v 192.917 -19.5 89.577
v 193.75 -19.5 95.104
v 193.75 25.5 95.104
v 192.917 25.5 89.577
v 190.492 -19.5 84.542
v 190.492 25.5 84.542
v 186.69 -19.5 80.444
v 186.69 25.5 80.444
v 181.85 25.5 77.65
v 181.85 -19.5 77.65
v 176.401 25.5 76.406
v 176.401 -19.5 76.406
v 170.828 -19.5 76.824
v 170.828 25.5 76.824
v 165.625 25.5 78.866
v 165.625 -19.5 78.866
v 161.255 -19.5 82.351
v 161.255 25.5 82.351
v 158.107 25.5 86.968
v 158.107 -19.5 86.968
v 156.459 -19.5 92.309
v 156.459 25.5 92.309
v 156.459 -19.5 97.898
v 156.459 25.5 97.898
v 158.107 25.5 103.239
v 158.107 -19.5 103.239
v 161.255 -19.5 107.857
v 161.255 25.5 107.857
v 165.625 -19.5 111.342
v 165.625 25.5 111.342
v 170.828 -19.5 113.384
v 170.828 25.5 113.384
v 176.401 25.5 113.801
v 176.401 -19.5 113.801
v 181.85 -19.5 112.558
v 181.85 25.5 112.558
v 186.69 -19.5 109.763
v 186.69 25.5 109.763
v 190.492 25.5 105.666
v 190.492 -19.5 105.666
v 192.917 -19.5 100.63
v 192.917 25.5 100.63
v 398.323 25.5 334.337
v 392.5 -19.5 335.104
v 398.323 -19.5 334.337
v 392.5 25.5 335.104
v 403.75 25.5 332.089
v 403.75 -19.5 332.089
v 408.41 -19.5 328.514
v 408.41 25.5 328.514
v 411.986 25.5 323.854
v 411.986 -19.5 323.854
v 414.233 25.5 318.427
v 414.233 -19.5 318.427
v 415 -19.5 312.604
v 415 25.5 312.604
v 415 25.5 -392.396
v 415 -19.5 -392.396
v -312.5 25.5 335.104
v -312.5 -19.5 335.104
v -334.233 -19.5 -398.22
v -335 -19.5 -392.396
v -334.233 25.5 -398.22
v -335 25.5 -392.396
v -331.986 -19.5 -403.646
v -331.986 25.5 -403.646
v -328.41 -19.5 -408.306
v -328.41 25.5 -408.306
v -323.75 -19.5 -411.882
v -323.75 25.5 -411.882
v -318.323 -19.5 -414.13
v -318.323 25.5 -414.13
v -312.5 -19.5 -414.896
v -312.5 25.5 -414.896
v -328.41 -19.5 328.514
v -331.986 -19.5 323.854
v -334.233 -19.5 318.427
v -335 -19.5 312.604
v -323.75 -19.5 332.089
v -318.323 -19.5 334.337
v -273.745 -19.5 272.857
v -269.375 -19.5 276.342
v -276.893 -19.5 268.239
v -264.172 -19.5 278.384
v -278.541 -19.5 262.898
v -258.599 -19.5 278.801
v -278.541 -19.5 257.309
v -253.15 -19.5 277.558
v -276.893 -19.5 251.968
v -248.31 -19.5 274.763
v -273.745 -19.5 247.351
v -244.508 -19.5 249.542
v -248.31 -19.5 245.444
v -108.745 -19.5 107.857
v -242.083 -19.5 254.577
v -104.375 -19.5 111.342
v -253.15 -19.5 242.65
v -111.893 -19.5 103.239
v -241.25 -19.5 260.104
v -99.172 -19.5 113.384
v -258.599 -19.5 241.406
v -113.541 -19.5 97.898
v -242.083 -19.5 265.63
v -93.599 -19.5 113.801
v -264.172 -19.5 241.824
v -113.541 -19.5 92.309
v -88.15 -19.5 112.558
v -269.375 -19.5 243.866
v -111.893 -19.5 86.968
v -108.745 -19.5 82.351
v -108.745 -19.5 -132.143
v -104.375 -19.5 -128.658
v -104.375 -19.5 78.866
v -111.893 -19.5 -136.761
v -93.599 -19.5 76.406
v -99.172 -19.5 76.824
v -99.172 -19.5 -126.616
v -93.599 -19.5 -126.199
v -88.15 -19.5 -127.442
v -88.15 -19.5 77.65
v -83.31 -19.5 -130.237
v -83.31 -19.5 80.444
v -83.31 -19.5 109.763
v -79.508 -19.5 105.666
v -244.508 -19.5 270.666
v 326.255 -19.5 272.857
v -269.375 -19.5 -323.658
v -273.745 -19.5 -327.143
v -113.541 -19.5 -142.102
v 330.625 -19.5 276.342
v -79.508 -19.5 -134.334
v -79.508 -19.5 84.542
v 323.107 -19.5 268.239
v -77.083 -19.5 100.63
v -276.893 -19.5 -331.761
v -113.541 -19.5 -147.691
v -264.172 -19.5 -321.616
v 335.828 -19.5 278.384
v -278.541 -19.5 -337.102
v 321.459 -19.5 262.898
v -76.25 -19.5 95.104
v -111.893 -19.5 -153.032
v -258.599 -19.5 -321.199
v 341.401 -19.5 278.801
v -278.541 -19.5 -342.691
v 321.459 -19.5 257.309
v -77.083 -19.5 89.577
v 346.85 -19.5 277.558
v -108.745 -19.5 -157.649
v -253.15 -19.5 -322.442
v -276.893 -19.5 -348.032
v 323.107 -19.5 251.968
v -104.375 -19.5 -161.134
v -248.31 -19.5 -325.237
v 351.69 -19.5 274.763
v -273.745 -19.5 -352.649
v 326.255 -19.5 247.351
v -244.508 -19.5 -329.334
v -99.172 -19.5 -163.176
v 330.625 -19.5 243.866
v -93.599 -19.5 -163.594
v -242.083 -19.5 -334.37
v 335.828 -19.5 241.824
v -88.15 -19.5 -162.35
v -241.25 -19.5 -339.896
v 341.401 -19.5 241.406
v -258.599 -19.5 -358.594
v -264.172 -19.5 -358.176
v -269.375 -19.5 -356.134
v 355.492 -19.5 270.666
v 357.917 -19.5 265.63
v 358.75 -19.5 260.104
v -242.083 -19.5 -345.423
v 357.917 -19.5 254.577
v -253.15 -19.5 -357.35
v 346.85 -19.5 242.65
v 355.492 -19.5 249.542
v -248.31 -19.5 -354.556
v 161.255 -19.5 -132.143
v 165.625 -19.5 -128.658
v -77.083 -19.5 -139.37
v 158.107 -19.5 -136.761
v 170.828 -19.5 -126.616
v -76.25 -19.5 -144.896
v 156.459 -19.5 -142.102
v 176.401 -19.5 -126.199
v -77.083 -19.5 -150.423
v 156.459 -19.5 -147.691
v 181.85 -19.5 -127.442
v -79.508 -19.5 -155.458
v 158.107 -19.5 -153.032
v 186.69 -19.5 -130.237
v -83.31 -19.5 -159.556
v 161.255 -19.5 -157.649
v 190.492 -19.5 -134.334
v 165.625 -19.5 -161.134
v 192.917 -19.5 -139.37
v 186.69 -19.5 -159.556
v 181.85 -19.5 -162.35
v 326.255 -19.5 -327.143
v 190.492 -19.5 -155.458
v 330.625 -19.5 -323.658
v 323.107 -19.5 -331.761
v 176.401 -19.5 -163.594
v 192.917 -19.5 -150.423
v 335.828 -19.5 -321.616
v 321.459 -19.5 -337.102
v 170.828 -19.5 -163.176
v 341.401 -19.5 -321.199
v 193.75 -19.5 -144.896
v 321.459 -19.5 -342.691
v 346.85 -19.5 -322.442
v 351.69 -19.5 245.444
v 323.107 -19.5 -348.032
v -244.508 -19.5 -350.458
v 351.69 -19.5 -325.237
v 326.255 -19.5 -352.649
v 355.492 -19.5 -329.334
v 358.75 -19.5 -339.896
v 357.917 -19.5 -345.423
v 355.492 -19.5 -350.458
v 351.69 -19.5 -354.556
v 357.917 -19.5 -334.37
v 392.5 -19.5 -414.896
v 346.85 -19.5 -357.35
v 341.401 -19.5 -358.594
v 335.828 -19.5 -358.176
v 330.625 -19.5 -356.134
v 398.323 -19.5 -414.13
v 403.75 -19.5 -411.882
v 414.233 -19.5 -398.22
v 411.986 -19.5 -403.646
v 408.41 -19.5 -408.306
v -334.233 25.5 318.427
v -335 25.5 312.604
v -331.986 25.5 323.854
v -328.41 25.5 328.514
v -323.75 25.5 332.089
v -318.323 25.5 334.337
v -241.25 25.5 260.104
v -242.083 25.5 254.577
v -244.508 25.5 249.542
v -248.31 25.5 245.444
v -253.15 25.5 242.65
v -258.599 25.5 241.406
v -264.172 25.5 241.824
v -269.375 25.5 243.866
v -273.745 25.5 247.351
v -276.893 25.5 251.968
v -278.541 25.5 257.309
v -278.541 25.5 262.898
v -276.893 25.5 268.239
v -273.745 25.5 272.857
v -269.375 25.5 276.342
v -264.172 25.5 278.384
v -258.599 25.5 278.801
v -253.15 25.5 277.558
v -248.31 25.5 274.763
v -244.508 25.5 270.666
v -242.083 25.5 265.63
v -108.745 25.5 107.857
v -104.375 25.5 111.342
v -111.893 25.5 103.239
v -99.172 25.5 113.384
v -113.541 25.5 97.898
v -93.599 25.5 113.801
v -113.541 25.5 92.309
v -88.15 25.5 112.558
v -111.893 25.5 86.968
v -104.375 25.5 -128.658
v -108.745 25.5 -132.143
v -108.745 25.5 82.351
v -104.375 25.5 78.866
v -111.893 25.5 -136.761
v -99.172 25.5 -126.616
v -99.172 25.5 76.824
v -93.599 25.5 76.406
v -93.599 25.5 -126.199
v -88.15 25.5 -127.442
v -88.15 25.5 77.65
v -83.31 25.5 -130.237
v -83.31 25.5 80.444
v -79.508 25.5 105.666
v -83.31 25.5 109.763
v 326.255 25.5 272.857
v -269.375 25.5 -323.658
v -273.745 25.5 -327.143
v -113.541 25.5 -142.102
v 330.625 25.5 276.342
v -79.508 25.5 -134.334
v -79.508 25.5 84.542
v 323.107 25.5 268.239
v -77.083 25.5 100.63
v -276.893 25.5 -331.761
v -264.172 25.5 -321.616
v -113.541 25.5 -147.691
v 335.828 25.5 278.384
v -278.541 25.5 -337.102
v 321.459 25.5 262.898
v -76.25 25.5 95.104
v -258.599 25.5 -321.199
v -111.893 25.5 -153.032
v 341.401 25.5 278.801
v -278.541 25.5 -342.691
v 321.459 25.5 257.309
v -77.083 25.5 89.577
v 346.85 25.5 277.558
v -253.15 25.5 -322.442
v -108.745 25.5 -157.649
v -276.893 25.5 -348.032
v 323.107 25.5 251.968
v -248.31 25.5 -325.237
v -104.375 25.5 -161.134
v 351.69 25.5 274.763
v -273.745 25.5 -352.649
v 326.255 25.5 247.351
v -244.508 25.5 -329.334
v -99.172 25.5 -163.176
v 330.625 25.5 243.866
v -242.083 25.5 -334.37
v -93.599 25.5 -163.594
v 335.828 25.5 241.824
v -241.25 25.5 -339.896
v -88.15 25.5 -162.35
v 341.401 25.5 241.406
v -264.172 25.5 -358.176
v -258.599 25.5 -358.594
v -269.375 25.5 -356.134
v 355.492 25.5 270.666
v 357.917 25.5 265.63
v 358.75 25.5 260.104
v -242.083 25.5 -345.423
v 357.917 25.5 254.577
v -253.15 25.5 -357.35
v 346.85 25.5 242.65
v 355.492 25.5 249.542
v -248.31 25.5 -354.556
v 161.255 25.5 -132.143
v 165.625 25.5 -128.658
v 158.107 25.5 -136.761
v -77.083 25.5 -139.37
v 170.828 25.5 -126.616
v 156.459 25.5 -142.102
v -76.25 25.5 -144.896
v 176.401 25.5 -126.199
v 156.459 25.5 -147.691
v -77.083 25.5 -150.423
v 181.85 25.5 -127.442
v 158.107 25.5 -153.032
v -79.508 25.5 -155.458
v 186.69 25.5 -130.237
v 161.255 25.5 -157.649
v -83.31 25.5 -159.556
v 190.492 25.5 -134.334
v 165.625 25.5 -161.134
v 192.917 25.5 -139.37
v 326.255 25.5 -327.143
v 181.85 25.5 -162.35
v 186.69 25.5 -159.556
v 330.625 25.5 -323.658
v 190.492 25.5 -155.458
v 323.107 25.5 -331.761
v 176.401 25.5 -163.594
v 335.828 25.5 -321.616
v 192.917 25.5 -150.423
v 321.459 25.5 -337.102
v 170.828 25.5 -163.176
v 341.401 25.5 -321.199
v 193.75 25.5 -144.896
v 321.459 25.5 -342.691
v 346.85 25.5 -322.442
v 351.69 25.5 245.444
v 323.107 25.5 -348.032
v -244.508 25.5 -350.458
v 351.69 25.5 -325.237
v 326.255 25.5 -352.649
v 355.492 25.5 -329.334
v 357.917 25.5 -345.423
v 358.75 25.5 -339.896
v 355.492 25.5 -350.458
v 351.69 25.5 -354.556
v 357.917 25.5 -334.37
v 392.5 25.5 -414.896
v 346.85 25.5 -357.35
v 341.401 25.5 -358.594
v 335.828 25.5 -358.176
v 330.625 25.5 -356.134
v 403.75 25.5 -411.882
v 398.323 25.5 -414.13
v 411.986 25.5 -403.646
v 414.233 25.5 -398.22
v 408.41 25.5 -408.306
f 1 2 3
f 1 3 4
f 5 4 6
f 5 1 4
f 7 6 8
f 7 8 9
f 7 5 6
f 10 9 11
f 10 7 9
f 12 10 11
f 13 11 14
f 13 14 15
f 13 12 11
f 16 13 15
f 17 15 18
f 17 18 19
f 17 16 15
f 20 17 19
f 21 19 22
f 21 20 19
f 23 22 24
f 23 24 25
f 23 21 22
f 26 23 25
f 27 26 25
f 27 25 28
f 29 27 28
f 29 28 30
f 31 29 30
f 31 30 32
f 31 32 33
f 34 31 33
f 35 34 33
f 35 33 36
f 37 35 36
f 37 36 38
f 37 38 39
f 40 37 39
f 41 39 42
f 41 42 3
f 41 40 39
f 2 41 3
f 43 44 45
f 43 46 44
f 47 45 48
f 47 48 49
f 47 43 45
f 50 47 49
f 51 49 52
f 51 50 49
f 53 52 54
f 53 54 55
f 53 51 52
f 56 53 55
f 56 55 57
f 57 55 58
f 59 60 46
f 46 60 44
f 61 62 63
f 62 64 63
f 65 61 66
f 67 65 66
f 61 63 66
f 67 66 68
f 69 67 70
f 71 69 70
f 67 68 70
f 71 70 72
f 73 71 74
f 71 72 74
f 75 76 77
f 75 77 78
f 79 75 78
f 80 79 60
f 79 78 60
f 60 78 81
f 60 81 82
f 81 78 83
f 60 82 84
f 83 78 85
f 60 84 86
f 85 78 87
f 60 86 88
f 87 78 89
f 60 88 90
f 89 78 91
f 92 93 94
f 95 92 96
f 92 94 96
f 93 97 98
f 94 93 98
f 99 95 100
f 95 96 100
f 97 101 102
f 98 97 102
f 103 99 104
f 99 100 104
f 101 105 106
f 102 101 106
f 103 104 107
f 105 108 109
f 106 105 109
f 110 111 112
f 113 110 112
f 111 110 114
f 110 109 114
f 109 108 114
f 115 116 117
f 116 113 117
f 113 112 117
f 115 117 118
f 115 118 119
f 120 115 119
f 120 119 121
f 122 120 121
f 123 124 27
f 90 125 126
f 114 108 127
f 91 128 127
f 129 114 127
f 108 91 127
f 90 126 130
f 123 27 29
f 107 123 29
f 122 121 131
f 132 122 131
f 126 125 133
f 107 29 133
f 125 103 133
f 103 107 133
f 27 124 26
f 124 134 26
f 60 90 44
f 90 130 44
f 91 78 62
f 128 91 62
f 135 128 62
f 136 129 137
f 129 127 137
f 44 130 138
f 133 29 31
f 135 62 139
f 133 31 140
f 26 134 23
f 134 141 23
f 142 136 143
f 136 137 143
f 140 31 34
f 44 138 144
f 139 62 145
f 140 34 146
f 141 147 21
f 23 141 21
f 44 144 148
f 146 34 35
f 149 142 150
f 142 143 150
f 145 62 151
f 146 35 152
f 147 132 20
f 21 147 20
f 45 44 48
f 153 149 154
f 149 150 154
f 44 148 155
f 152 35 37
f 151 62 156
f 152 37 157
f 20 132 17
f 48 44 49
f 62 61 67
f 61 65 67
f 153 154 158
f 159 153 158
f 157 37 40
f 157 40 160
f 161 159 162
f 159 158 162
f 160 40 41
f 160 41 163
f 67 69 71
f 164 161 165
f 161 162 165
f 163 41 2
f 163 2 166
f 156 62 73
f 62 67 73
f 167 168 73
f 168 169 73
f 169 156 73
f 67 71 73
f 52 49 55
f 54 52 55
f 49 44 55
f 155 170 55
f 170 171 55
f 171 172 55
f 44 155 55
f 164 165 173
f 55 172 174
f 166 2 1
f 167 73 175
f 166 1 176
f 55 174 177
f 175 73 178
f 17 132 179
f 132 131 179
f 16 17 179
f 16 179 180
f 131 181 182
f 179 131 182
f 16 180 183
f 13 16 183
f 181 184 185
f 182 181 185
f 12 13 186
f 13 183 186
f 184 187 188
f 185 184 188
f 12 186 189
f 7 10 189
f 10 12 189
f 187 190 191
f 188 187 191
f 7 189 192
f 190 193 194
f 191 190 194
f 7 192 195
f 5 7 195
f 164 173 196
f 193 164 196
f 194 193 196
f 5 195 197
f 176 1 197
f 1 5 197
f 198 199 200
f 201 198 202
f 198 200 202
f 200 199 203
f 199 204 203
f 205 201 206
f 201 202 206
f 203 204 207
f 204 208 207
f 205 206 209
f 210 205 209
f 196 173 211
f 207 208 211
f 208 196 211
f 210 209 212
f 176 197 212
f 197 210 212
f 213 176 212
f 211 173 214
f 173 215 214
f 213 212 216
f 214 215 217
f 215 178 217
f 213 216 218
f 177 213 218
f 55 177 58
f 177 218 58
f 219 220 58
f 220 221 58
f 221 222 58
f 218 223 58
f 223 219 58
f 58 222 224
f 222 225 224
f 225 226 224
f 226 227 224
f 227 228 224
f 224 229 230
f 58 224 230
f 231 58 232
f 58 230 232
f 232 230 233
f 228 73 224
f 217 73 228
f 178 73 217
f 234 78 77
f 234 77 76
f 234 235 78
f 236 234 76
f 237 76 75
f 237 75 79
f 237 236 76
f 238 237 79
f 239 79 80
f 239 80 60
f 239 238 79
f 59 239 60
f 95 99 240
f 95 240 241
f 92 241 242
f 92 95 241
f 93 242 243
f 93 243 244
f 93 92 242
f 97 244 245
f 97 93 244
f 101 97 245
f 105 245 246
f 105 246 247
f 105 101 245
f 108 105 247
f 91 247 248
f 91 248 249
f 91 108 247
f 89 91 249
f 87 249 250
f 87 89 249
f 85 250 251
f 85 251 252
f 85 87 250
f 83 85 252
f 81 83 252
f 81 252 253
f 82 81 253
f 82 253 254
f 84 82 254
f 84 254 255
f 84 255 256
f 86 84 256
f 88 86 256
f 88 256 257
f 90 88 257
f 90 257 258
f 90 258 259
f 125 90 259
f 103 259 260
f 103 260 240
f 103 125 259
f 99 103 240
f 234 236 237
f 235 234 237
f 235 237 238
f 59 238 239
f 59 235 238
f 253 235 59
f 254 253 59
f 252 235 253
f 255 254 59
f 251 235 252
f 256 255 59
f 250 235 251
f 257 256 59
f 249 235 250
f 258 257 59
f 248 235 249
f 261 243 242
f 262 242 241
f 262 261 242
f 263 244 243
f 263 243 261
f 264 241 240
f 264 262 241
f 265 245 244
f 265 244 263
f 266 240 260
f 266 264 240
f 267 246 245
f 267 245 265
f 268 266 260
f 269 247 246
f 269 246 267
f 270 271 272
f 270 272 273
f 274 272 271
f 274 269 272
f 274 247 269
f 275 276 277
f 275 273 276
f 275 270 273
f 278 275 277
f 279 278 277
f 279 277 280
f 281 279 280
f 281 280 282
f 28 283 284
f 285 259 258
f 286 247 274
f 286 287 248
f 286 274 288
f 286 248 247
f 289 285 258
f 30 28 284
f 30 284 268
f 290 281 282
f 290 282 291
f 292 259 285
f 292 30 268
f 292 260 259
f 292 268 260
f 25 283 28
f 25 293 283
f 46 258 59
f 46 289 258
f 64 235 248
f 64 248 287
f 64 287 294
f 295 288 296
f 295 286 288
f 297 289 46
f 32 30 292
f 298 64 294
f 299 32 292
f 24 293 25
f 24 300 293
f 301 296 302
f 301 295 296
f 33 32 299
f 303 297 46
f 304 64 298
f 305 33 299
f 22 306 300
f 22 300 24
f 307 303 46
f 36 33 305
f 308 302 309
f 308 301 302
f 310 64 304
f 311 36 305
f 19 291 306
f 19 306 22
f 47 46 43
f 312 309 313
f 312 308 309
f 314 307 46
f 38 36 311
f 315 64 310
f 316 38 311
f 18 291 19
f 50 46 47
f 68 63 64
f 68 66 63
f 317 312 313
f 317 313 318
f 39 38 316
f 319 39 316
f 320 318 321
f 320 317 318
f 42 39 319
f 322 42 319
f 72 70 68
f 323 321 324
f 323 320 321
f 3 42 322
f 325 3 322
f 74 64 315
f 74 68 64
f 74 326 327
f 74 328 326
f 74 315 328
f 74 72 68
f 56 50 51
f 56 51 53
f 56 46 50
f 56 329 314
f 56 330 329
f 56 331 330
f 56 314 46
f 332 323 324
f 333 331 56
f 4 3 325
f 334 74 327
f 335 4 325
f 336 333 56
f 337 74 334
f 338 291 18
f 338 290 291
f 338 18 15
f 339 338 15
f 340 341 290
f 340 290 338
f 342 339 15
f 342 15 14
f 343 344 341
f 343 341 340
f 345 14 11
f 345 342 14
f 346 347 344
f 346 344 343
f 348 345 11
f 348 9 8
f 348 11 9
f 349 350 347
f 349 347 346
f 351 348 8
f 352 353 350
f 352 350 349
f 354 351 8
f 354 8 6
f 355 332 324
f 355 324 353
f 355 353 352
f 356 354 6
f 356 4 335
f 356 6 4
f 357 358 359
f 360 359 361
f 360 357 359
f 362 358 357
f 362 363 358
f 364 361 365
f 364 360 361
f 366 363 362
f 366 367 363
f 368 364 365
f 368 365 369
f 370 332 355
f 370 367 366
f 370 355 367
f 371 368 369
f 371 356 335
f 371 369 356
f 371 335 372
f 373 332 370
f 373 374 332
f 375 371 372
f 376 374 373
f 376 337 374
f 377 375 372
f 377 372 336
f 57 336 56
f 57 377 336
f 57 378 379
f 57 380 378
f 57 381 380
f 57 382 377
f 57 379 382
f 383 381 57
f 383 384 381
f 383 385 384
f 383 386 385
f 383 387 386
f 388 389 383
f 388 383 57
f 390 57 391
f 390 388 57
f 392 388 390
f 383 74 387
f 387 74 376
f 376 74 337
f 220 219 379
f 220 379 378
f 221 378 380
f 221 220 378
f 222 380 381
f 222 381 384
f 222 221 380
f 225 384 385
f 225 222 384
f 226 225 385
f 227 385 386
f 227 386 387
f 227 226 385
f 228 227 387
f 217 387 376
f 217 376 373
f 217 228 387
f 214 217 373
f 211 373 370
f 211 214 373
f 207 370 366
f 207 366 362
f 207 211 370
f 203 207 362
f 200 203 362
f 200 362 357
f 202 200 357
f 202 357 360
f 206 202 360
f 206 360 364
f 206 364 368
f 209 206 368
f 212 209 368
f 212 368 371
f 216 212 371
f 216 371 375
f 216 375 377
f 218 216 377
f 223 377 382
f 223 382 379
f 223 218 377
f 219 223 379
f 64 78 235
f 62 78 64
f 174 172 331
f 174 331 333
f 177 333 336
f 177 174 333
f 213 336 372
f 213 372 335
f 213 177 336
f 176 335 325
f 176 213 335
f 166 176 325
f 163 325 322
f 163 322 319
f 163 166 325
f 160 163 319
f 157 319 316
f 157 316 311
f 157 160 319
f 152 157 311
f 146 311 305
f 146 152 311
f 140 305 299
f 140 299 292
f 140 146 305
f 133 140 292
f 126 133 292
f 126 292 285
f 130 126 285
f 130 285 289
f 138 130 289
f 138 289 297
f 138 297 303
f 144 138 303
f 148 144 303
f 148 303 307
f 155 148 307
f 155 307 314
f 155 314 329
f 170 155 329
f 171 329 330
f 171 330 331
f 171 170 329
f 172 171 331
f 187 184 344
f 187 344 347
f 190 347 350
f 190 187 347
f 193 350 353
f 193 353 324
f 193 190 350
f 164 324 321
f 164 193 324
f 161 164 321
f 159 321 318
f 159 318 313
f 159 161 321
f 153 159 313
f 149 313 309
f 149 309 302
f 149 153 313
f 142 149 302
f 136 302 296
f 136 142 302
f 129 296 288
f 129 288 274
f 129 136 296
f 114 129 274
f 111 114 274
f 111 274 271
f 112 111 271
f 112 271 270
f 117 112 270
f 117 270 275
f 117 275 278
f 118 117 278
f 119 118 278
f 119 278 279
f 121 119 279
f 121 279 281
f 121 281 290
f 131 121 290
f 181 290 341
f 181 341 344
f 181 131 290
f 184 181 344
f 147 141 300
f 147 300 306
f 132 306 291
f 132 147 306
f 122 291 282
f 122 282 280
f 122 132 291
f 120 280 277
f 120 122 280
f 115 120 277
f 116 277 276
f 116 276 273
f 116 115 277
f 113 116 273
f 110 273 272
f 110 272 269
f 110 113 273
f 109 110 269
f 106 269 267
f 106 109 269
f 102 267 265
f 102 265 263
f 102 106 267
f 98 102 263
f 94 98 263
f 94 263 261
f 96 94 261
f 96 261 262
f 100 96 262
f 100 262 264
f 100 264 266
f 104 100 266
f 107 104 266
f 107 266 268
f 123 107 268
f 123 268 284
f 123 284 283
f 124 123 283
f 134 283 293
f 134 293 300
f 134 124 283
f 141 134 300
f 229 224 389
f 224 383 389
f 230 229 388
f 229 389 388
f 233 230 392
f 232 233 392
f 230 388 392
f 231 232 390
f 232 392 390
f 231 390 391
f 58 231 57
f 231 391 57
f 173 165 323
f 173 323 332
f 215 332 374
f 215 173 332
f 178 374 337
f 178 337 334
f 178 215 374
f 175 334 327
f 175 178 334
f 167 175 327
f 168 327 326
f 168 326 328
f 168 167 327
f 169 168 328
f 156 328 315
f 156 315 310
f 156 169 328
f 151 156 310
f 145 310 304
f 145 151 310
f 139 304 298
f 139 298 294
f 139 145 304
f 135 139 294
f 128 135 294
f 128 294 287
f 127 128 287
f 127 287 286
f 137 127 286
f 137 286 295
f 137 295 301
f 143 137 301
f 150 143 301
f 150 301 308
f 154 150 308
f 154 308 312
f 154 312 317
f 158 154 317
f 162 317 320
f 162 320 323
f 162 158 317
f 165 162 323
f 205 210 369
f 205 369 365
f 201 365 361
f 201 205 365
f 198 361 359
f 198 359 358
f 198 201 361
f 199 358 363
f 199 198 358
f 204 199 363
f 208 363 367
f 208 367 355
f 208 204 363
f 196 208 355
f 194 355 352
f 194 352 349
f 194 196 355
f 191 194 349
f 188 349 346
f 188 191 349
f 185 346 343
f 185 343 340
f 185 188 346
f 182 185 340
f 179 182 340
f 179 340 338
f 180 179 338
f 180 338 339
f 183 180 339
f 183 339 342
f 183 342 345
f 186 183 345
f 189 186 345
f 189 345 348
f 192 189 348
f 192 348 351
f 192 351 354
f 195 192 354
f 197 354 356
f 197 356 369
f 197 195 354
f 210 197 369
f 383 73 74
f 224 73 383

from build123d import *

# Parameters (mm, degrees)
SKETCH1_W           = 100
SKETCH1_H           = 100
SKETCH1_R           = 2.5
BOSS_EXTRUDE1_DEPTH = 6
FILLET1_R           = 3
FILLET2_R           = 3
SCALE1_SCALE        = 7.5


with BuildPart() as part:
    # Sketch1 → Boss-Extrude1 (new body)
    with BuildSketch(Plane(origin=(0, 0, 0), x_dir=(1, 0, 0), z_dir=(0, 1, 0))):
        with Locations((40, 40)):
            Rectangle(SKETCH1_W, SKETCH1_H)
        Circle(SKETCH1_R, mode=Mode.SUBTRACT)
        with Locations((80, 0)):
            Circle(SKETCH1_R, mode=Mode.SUBTRACT)
        with Locations((0, 80)):
            Circle(SKETCH1_R, mode=Mode.SUBTRACT)
        with Locations((80, 80)):
            Circle(SKETCH1_R, mode=Mode.SUBTRACT)
        with Locations((22, 22)):
            Circle(SKETCH1_R, mode=Mode.SUBTRACT)
        with Locations((58, 22)):
            Circle(SKETCH1_R, mode=Mode.SUBTRACT)
        with Locations((22, 54)):
            Circle(SKETCH1_R, mode=Mode.SUBTRACT)
        with Locations((58, 54)):
            Circle(SKETCH1_R, mode=Mode.SUBTRACT)
    extrude(amount=BOSS_EXTRUDE1_DEPTH)

    # Fillet1
    fillet1_edges = [part.edges().sort_by_distance(p)[0] for p in [
        (90, 3, 10),
        (-10, 3, 10),
    ]]
    fillet(fillet1_edges, radius=FILLET1_R)

    # Fillet2
    fillet2_edges = [part.edges().sort_by_distance(p)[0] for p in [
        (-10, 3, -90),
        (90, 3, -90),
    ]]
    fillet(fillet2_edges, radius=FILLET2_R)


with BuildPart() as part_1:
    # Scale1: scaled about (40, 3, -40.015971177)
    add(part.part.scale(SCALE1_SCALE).moved(Location((-260, -19.5, 260.103812651))))


solid = part_1.part
